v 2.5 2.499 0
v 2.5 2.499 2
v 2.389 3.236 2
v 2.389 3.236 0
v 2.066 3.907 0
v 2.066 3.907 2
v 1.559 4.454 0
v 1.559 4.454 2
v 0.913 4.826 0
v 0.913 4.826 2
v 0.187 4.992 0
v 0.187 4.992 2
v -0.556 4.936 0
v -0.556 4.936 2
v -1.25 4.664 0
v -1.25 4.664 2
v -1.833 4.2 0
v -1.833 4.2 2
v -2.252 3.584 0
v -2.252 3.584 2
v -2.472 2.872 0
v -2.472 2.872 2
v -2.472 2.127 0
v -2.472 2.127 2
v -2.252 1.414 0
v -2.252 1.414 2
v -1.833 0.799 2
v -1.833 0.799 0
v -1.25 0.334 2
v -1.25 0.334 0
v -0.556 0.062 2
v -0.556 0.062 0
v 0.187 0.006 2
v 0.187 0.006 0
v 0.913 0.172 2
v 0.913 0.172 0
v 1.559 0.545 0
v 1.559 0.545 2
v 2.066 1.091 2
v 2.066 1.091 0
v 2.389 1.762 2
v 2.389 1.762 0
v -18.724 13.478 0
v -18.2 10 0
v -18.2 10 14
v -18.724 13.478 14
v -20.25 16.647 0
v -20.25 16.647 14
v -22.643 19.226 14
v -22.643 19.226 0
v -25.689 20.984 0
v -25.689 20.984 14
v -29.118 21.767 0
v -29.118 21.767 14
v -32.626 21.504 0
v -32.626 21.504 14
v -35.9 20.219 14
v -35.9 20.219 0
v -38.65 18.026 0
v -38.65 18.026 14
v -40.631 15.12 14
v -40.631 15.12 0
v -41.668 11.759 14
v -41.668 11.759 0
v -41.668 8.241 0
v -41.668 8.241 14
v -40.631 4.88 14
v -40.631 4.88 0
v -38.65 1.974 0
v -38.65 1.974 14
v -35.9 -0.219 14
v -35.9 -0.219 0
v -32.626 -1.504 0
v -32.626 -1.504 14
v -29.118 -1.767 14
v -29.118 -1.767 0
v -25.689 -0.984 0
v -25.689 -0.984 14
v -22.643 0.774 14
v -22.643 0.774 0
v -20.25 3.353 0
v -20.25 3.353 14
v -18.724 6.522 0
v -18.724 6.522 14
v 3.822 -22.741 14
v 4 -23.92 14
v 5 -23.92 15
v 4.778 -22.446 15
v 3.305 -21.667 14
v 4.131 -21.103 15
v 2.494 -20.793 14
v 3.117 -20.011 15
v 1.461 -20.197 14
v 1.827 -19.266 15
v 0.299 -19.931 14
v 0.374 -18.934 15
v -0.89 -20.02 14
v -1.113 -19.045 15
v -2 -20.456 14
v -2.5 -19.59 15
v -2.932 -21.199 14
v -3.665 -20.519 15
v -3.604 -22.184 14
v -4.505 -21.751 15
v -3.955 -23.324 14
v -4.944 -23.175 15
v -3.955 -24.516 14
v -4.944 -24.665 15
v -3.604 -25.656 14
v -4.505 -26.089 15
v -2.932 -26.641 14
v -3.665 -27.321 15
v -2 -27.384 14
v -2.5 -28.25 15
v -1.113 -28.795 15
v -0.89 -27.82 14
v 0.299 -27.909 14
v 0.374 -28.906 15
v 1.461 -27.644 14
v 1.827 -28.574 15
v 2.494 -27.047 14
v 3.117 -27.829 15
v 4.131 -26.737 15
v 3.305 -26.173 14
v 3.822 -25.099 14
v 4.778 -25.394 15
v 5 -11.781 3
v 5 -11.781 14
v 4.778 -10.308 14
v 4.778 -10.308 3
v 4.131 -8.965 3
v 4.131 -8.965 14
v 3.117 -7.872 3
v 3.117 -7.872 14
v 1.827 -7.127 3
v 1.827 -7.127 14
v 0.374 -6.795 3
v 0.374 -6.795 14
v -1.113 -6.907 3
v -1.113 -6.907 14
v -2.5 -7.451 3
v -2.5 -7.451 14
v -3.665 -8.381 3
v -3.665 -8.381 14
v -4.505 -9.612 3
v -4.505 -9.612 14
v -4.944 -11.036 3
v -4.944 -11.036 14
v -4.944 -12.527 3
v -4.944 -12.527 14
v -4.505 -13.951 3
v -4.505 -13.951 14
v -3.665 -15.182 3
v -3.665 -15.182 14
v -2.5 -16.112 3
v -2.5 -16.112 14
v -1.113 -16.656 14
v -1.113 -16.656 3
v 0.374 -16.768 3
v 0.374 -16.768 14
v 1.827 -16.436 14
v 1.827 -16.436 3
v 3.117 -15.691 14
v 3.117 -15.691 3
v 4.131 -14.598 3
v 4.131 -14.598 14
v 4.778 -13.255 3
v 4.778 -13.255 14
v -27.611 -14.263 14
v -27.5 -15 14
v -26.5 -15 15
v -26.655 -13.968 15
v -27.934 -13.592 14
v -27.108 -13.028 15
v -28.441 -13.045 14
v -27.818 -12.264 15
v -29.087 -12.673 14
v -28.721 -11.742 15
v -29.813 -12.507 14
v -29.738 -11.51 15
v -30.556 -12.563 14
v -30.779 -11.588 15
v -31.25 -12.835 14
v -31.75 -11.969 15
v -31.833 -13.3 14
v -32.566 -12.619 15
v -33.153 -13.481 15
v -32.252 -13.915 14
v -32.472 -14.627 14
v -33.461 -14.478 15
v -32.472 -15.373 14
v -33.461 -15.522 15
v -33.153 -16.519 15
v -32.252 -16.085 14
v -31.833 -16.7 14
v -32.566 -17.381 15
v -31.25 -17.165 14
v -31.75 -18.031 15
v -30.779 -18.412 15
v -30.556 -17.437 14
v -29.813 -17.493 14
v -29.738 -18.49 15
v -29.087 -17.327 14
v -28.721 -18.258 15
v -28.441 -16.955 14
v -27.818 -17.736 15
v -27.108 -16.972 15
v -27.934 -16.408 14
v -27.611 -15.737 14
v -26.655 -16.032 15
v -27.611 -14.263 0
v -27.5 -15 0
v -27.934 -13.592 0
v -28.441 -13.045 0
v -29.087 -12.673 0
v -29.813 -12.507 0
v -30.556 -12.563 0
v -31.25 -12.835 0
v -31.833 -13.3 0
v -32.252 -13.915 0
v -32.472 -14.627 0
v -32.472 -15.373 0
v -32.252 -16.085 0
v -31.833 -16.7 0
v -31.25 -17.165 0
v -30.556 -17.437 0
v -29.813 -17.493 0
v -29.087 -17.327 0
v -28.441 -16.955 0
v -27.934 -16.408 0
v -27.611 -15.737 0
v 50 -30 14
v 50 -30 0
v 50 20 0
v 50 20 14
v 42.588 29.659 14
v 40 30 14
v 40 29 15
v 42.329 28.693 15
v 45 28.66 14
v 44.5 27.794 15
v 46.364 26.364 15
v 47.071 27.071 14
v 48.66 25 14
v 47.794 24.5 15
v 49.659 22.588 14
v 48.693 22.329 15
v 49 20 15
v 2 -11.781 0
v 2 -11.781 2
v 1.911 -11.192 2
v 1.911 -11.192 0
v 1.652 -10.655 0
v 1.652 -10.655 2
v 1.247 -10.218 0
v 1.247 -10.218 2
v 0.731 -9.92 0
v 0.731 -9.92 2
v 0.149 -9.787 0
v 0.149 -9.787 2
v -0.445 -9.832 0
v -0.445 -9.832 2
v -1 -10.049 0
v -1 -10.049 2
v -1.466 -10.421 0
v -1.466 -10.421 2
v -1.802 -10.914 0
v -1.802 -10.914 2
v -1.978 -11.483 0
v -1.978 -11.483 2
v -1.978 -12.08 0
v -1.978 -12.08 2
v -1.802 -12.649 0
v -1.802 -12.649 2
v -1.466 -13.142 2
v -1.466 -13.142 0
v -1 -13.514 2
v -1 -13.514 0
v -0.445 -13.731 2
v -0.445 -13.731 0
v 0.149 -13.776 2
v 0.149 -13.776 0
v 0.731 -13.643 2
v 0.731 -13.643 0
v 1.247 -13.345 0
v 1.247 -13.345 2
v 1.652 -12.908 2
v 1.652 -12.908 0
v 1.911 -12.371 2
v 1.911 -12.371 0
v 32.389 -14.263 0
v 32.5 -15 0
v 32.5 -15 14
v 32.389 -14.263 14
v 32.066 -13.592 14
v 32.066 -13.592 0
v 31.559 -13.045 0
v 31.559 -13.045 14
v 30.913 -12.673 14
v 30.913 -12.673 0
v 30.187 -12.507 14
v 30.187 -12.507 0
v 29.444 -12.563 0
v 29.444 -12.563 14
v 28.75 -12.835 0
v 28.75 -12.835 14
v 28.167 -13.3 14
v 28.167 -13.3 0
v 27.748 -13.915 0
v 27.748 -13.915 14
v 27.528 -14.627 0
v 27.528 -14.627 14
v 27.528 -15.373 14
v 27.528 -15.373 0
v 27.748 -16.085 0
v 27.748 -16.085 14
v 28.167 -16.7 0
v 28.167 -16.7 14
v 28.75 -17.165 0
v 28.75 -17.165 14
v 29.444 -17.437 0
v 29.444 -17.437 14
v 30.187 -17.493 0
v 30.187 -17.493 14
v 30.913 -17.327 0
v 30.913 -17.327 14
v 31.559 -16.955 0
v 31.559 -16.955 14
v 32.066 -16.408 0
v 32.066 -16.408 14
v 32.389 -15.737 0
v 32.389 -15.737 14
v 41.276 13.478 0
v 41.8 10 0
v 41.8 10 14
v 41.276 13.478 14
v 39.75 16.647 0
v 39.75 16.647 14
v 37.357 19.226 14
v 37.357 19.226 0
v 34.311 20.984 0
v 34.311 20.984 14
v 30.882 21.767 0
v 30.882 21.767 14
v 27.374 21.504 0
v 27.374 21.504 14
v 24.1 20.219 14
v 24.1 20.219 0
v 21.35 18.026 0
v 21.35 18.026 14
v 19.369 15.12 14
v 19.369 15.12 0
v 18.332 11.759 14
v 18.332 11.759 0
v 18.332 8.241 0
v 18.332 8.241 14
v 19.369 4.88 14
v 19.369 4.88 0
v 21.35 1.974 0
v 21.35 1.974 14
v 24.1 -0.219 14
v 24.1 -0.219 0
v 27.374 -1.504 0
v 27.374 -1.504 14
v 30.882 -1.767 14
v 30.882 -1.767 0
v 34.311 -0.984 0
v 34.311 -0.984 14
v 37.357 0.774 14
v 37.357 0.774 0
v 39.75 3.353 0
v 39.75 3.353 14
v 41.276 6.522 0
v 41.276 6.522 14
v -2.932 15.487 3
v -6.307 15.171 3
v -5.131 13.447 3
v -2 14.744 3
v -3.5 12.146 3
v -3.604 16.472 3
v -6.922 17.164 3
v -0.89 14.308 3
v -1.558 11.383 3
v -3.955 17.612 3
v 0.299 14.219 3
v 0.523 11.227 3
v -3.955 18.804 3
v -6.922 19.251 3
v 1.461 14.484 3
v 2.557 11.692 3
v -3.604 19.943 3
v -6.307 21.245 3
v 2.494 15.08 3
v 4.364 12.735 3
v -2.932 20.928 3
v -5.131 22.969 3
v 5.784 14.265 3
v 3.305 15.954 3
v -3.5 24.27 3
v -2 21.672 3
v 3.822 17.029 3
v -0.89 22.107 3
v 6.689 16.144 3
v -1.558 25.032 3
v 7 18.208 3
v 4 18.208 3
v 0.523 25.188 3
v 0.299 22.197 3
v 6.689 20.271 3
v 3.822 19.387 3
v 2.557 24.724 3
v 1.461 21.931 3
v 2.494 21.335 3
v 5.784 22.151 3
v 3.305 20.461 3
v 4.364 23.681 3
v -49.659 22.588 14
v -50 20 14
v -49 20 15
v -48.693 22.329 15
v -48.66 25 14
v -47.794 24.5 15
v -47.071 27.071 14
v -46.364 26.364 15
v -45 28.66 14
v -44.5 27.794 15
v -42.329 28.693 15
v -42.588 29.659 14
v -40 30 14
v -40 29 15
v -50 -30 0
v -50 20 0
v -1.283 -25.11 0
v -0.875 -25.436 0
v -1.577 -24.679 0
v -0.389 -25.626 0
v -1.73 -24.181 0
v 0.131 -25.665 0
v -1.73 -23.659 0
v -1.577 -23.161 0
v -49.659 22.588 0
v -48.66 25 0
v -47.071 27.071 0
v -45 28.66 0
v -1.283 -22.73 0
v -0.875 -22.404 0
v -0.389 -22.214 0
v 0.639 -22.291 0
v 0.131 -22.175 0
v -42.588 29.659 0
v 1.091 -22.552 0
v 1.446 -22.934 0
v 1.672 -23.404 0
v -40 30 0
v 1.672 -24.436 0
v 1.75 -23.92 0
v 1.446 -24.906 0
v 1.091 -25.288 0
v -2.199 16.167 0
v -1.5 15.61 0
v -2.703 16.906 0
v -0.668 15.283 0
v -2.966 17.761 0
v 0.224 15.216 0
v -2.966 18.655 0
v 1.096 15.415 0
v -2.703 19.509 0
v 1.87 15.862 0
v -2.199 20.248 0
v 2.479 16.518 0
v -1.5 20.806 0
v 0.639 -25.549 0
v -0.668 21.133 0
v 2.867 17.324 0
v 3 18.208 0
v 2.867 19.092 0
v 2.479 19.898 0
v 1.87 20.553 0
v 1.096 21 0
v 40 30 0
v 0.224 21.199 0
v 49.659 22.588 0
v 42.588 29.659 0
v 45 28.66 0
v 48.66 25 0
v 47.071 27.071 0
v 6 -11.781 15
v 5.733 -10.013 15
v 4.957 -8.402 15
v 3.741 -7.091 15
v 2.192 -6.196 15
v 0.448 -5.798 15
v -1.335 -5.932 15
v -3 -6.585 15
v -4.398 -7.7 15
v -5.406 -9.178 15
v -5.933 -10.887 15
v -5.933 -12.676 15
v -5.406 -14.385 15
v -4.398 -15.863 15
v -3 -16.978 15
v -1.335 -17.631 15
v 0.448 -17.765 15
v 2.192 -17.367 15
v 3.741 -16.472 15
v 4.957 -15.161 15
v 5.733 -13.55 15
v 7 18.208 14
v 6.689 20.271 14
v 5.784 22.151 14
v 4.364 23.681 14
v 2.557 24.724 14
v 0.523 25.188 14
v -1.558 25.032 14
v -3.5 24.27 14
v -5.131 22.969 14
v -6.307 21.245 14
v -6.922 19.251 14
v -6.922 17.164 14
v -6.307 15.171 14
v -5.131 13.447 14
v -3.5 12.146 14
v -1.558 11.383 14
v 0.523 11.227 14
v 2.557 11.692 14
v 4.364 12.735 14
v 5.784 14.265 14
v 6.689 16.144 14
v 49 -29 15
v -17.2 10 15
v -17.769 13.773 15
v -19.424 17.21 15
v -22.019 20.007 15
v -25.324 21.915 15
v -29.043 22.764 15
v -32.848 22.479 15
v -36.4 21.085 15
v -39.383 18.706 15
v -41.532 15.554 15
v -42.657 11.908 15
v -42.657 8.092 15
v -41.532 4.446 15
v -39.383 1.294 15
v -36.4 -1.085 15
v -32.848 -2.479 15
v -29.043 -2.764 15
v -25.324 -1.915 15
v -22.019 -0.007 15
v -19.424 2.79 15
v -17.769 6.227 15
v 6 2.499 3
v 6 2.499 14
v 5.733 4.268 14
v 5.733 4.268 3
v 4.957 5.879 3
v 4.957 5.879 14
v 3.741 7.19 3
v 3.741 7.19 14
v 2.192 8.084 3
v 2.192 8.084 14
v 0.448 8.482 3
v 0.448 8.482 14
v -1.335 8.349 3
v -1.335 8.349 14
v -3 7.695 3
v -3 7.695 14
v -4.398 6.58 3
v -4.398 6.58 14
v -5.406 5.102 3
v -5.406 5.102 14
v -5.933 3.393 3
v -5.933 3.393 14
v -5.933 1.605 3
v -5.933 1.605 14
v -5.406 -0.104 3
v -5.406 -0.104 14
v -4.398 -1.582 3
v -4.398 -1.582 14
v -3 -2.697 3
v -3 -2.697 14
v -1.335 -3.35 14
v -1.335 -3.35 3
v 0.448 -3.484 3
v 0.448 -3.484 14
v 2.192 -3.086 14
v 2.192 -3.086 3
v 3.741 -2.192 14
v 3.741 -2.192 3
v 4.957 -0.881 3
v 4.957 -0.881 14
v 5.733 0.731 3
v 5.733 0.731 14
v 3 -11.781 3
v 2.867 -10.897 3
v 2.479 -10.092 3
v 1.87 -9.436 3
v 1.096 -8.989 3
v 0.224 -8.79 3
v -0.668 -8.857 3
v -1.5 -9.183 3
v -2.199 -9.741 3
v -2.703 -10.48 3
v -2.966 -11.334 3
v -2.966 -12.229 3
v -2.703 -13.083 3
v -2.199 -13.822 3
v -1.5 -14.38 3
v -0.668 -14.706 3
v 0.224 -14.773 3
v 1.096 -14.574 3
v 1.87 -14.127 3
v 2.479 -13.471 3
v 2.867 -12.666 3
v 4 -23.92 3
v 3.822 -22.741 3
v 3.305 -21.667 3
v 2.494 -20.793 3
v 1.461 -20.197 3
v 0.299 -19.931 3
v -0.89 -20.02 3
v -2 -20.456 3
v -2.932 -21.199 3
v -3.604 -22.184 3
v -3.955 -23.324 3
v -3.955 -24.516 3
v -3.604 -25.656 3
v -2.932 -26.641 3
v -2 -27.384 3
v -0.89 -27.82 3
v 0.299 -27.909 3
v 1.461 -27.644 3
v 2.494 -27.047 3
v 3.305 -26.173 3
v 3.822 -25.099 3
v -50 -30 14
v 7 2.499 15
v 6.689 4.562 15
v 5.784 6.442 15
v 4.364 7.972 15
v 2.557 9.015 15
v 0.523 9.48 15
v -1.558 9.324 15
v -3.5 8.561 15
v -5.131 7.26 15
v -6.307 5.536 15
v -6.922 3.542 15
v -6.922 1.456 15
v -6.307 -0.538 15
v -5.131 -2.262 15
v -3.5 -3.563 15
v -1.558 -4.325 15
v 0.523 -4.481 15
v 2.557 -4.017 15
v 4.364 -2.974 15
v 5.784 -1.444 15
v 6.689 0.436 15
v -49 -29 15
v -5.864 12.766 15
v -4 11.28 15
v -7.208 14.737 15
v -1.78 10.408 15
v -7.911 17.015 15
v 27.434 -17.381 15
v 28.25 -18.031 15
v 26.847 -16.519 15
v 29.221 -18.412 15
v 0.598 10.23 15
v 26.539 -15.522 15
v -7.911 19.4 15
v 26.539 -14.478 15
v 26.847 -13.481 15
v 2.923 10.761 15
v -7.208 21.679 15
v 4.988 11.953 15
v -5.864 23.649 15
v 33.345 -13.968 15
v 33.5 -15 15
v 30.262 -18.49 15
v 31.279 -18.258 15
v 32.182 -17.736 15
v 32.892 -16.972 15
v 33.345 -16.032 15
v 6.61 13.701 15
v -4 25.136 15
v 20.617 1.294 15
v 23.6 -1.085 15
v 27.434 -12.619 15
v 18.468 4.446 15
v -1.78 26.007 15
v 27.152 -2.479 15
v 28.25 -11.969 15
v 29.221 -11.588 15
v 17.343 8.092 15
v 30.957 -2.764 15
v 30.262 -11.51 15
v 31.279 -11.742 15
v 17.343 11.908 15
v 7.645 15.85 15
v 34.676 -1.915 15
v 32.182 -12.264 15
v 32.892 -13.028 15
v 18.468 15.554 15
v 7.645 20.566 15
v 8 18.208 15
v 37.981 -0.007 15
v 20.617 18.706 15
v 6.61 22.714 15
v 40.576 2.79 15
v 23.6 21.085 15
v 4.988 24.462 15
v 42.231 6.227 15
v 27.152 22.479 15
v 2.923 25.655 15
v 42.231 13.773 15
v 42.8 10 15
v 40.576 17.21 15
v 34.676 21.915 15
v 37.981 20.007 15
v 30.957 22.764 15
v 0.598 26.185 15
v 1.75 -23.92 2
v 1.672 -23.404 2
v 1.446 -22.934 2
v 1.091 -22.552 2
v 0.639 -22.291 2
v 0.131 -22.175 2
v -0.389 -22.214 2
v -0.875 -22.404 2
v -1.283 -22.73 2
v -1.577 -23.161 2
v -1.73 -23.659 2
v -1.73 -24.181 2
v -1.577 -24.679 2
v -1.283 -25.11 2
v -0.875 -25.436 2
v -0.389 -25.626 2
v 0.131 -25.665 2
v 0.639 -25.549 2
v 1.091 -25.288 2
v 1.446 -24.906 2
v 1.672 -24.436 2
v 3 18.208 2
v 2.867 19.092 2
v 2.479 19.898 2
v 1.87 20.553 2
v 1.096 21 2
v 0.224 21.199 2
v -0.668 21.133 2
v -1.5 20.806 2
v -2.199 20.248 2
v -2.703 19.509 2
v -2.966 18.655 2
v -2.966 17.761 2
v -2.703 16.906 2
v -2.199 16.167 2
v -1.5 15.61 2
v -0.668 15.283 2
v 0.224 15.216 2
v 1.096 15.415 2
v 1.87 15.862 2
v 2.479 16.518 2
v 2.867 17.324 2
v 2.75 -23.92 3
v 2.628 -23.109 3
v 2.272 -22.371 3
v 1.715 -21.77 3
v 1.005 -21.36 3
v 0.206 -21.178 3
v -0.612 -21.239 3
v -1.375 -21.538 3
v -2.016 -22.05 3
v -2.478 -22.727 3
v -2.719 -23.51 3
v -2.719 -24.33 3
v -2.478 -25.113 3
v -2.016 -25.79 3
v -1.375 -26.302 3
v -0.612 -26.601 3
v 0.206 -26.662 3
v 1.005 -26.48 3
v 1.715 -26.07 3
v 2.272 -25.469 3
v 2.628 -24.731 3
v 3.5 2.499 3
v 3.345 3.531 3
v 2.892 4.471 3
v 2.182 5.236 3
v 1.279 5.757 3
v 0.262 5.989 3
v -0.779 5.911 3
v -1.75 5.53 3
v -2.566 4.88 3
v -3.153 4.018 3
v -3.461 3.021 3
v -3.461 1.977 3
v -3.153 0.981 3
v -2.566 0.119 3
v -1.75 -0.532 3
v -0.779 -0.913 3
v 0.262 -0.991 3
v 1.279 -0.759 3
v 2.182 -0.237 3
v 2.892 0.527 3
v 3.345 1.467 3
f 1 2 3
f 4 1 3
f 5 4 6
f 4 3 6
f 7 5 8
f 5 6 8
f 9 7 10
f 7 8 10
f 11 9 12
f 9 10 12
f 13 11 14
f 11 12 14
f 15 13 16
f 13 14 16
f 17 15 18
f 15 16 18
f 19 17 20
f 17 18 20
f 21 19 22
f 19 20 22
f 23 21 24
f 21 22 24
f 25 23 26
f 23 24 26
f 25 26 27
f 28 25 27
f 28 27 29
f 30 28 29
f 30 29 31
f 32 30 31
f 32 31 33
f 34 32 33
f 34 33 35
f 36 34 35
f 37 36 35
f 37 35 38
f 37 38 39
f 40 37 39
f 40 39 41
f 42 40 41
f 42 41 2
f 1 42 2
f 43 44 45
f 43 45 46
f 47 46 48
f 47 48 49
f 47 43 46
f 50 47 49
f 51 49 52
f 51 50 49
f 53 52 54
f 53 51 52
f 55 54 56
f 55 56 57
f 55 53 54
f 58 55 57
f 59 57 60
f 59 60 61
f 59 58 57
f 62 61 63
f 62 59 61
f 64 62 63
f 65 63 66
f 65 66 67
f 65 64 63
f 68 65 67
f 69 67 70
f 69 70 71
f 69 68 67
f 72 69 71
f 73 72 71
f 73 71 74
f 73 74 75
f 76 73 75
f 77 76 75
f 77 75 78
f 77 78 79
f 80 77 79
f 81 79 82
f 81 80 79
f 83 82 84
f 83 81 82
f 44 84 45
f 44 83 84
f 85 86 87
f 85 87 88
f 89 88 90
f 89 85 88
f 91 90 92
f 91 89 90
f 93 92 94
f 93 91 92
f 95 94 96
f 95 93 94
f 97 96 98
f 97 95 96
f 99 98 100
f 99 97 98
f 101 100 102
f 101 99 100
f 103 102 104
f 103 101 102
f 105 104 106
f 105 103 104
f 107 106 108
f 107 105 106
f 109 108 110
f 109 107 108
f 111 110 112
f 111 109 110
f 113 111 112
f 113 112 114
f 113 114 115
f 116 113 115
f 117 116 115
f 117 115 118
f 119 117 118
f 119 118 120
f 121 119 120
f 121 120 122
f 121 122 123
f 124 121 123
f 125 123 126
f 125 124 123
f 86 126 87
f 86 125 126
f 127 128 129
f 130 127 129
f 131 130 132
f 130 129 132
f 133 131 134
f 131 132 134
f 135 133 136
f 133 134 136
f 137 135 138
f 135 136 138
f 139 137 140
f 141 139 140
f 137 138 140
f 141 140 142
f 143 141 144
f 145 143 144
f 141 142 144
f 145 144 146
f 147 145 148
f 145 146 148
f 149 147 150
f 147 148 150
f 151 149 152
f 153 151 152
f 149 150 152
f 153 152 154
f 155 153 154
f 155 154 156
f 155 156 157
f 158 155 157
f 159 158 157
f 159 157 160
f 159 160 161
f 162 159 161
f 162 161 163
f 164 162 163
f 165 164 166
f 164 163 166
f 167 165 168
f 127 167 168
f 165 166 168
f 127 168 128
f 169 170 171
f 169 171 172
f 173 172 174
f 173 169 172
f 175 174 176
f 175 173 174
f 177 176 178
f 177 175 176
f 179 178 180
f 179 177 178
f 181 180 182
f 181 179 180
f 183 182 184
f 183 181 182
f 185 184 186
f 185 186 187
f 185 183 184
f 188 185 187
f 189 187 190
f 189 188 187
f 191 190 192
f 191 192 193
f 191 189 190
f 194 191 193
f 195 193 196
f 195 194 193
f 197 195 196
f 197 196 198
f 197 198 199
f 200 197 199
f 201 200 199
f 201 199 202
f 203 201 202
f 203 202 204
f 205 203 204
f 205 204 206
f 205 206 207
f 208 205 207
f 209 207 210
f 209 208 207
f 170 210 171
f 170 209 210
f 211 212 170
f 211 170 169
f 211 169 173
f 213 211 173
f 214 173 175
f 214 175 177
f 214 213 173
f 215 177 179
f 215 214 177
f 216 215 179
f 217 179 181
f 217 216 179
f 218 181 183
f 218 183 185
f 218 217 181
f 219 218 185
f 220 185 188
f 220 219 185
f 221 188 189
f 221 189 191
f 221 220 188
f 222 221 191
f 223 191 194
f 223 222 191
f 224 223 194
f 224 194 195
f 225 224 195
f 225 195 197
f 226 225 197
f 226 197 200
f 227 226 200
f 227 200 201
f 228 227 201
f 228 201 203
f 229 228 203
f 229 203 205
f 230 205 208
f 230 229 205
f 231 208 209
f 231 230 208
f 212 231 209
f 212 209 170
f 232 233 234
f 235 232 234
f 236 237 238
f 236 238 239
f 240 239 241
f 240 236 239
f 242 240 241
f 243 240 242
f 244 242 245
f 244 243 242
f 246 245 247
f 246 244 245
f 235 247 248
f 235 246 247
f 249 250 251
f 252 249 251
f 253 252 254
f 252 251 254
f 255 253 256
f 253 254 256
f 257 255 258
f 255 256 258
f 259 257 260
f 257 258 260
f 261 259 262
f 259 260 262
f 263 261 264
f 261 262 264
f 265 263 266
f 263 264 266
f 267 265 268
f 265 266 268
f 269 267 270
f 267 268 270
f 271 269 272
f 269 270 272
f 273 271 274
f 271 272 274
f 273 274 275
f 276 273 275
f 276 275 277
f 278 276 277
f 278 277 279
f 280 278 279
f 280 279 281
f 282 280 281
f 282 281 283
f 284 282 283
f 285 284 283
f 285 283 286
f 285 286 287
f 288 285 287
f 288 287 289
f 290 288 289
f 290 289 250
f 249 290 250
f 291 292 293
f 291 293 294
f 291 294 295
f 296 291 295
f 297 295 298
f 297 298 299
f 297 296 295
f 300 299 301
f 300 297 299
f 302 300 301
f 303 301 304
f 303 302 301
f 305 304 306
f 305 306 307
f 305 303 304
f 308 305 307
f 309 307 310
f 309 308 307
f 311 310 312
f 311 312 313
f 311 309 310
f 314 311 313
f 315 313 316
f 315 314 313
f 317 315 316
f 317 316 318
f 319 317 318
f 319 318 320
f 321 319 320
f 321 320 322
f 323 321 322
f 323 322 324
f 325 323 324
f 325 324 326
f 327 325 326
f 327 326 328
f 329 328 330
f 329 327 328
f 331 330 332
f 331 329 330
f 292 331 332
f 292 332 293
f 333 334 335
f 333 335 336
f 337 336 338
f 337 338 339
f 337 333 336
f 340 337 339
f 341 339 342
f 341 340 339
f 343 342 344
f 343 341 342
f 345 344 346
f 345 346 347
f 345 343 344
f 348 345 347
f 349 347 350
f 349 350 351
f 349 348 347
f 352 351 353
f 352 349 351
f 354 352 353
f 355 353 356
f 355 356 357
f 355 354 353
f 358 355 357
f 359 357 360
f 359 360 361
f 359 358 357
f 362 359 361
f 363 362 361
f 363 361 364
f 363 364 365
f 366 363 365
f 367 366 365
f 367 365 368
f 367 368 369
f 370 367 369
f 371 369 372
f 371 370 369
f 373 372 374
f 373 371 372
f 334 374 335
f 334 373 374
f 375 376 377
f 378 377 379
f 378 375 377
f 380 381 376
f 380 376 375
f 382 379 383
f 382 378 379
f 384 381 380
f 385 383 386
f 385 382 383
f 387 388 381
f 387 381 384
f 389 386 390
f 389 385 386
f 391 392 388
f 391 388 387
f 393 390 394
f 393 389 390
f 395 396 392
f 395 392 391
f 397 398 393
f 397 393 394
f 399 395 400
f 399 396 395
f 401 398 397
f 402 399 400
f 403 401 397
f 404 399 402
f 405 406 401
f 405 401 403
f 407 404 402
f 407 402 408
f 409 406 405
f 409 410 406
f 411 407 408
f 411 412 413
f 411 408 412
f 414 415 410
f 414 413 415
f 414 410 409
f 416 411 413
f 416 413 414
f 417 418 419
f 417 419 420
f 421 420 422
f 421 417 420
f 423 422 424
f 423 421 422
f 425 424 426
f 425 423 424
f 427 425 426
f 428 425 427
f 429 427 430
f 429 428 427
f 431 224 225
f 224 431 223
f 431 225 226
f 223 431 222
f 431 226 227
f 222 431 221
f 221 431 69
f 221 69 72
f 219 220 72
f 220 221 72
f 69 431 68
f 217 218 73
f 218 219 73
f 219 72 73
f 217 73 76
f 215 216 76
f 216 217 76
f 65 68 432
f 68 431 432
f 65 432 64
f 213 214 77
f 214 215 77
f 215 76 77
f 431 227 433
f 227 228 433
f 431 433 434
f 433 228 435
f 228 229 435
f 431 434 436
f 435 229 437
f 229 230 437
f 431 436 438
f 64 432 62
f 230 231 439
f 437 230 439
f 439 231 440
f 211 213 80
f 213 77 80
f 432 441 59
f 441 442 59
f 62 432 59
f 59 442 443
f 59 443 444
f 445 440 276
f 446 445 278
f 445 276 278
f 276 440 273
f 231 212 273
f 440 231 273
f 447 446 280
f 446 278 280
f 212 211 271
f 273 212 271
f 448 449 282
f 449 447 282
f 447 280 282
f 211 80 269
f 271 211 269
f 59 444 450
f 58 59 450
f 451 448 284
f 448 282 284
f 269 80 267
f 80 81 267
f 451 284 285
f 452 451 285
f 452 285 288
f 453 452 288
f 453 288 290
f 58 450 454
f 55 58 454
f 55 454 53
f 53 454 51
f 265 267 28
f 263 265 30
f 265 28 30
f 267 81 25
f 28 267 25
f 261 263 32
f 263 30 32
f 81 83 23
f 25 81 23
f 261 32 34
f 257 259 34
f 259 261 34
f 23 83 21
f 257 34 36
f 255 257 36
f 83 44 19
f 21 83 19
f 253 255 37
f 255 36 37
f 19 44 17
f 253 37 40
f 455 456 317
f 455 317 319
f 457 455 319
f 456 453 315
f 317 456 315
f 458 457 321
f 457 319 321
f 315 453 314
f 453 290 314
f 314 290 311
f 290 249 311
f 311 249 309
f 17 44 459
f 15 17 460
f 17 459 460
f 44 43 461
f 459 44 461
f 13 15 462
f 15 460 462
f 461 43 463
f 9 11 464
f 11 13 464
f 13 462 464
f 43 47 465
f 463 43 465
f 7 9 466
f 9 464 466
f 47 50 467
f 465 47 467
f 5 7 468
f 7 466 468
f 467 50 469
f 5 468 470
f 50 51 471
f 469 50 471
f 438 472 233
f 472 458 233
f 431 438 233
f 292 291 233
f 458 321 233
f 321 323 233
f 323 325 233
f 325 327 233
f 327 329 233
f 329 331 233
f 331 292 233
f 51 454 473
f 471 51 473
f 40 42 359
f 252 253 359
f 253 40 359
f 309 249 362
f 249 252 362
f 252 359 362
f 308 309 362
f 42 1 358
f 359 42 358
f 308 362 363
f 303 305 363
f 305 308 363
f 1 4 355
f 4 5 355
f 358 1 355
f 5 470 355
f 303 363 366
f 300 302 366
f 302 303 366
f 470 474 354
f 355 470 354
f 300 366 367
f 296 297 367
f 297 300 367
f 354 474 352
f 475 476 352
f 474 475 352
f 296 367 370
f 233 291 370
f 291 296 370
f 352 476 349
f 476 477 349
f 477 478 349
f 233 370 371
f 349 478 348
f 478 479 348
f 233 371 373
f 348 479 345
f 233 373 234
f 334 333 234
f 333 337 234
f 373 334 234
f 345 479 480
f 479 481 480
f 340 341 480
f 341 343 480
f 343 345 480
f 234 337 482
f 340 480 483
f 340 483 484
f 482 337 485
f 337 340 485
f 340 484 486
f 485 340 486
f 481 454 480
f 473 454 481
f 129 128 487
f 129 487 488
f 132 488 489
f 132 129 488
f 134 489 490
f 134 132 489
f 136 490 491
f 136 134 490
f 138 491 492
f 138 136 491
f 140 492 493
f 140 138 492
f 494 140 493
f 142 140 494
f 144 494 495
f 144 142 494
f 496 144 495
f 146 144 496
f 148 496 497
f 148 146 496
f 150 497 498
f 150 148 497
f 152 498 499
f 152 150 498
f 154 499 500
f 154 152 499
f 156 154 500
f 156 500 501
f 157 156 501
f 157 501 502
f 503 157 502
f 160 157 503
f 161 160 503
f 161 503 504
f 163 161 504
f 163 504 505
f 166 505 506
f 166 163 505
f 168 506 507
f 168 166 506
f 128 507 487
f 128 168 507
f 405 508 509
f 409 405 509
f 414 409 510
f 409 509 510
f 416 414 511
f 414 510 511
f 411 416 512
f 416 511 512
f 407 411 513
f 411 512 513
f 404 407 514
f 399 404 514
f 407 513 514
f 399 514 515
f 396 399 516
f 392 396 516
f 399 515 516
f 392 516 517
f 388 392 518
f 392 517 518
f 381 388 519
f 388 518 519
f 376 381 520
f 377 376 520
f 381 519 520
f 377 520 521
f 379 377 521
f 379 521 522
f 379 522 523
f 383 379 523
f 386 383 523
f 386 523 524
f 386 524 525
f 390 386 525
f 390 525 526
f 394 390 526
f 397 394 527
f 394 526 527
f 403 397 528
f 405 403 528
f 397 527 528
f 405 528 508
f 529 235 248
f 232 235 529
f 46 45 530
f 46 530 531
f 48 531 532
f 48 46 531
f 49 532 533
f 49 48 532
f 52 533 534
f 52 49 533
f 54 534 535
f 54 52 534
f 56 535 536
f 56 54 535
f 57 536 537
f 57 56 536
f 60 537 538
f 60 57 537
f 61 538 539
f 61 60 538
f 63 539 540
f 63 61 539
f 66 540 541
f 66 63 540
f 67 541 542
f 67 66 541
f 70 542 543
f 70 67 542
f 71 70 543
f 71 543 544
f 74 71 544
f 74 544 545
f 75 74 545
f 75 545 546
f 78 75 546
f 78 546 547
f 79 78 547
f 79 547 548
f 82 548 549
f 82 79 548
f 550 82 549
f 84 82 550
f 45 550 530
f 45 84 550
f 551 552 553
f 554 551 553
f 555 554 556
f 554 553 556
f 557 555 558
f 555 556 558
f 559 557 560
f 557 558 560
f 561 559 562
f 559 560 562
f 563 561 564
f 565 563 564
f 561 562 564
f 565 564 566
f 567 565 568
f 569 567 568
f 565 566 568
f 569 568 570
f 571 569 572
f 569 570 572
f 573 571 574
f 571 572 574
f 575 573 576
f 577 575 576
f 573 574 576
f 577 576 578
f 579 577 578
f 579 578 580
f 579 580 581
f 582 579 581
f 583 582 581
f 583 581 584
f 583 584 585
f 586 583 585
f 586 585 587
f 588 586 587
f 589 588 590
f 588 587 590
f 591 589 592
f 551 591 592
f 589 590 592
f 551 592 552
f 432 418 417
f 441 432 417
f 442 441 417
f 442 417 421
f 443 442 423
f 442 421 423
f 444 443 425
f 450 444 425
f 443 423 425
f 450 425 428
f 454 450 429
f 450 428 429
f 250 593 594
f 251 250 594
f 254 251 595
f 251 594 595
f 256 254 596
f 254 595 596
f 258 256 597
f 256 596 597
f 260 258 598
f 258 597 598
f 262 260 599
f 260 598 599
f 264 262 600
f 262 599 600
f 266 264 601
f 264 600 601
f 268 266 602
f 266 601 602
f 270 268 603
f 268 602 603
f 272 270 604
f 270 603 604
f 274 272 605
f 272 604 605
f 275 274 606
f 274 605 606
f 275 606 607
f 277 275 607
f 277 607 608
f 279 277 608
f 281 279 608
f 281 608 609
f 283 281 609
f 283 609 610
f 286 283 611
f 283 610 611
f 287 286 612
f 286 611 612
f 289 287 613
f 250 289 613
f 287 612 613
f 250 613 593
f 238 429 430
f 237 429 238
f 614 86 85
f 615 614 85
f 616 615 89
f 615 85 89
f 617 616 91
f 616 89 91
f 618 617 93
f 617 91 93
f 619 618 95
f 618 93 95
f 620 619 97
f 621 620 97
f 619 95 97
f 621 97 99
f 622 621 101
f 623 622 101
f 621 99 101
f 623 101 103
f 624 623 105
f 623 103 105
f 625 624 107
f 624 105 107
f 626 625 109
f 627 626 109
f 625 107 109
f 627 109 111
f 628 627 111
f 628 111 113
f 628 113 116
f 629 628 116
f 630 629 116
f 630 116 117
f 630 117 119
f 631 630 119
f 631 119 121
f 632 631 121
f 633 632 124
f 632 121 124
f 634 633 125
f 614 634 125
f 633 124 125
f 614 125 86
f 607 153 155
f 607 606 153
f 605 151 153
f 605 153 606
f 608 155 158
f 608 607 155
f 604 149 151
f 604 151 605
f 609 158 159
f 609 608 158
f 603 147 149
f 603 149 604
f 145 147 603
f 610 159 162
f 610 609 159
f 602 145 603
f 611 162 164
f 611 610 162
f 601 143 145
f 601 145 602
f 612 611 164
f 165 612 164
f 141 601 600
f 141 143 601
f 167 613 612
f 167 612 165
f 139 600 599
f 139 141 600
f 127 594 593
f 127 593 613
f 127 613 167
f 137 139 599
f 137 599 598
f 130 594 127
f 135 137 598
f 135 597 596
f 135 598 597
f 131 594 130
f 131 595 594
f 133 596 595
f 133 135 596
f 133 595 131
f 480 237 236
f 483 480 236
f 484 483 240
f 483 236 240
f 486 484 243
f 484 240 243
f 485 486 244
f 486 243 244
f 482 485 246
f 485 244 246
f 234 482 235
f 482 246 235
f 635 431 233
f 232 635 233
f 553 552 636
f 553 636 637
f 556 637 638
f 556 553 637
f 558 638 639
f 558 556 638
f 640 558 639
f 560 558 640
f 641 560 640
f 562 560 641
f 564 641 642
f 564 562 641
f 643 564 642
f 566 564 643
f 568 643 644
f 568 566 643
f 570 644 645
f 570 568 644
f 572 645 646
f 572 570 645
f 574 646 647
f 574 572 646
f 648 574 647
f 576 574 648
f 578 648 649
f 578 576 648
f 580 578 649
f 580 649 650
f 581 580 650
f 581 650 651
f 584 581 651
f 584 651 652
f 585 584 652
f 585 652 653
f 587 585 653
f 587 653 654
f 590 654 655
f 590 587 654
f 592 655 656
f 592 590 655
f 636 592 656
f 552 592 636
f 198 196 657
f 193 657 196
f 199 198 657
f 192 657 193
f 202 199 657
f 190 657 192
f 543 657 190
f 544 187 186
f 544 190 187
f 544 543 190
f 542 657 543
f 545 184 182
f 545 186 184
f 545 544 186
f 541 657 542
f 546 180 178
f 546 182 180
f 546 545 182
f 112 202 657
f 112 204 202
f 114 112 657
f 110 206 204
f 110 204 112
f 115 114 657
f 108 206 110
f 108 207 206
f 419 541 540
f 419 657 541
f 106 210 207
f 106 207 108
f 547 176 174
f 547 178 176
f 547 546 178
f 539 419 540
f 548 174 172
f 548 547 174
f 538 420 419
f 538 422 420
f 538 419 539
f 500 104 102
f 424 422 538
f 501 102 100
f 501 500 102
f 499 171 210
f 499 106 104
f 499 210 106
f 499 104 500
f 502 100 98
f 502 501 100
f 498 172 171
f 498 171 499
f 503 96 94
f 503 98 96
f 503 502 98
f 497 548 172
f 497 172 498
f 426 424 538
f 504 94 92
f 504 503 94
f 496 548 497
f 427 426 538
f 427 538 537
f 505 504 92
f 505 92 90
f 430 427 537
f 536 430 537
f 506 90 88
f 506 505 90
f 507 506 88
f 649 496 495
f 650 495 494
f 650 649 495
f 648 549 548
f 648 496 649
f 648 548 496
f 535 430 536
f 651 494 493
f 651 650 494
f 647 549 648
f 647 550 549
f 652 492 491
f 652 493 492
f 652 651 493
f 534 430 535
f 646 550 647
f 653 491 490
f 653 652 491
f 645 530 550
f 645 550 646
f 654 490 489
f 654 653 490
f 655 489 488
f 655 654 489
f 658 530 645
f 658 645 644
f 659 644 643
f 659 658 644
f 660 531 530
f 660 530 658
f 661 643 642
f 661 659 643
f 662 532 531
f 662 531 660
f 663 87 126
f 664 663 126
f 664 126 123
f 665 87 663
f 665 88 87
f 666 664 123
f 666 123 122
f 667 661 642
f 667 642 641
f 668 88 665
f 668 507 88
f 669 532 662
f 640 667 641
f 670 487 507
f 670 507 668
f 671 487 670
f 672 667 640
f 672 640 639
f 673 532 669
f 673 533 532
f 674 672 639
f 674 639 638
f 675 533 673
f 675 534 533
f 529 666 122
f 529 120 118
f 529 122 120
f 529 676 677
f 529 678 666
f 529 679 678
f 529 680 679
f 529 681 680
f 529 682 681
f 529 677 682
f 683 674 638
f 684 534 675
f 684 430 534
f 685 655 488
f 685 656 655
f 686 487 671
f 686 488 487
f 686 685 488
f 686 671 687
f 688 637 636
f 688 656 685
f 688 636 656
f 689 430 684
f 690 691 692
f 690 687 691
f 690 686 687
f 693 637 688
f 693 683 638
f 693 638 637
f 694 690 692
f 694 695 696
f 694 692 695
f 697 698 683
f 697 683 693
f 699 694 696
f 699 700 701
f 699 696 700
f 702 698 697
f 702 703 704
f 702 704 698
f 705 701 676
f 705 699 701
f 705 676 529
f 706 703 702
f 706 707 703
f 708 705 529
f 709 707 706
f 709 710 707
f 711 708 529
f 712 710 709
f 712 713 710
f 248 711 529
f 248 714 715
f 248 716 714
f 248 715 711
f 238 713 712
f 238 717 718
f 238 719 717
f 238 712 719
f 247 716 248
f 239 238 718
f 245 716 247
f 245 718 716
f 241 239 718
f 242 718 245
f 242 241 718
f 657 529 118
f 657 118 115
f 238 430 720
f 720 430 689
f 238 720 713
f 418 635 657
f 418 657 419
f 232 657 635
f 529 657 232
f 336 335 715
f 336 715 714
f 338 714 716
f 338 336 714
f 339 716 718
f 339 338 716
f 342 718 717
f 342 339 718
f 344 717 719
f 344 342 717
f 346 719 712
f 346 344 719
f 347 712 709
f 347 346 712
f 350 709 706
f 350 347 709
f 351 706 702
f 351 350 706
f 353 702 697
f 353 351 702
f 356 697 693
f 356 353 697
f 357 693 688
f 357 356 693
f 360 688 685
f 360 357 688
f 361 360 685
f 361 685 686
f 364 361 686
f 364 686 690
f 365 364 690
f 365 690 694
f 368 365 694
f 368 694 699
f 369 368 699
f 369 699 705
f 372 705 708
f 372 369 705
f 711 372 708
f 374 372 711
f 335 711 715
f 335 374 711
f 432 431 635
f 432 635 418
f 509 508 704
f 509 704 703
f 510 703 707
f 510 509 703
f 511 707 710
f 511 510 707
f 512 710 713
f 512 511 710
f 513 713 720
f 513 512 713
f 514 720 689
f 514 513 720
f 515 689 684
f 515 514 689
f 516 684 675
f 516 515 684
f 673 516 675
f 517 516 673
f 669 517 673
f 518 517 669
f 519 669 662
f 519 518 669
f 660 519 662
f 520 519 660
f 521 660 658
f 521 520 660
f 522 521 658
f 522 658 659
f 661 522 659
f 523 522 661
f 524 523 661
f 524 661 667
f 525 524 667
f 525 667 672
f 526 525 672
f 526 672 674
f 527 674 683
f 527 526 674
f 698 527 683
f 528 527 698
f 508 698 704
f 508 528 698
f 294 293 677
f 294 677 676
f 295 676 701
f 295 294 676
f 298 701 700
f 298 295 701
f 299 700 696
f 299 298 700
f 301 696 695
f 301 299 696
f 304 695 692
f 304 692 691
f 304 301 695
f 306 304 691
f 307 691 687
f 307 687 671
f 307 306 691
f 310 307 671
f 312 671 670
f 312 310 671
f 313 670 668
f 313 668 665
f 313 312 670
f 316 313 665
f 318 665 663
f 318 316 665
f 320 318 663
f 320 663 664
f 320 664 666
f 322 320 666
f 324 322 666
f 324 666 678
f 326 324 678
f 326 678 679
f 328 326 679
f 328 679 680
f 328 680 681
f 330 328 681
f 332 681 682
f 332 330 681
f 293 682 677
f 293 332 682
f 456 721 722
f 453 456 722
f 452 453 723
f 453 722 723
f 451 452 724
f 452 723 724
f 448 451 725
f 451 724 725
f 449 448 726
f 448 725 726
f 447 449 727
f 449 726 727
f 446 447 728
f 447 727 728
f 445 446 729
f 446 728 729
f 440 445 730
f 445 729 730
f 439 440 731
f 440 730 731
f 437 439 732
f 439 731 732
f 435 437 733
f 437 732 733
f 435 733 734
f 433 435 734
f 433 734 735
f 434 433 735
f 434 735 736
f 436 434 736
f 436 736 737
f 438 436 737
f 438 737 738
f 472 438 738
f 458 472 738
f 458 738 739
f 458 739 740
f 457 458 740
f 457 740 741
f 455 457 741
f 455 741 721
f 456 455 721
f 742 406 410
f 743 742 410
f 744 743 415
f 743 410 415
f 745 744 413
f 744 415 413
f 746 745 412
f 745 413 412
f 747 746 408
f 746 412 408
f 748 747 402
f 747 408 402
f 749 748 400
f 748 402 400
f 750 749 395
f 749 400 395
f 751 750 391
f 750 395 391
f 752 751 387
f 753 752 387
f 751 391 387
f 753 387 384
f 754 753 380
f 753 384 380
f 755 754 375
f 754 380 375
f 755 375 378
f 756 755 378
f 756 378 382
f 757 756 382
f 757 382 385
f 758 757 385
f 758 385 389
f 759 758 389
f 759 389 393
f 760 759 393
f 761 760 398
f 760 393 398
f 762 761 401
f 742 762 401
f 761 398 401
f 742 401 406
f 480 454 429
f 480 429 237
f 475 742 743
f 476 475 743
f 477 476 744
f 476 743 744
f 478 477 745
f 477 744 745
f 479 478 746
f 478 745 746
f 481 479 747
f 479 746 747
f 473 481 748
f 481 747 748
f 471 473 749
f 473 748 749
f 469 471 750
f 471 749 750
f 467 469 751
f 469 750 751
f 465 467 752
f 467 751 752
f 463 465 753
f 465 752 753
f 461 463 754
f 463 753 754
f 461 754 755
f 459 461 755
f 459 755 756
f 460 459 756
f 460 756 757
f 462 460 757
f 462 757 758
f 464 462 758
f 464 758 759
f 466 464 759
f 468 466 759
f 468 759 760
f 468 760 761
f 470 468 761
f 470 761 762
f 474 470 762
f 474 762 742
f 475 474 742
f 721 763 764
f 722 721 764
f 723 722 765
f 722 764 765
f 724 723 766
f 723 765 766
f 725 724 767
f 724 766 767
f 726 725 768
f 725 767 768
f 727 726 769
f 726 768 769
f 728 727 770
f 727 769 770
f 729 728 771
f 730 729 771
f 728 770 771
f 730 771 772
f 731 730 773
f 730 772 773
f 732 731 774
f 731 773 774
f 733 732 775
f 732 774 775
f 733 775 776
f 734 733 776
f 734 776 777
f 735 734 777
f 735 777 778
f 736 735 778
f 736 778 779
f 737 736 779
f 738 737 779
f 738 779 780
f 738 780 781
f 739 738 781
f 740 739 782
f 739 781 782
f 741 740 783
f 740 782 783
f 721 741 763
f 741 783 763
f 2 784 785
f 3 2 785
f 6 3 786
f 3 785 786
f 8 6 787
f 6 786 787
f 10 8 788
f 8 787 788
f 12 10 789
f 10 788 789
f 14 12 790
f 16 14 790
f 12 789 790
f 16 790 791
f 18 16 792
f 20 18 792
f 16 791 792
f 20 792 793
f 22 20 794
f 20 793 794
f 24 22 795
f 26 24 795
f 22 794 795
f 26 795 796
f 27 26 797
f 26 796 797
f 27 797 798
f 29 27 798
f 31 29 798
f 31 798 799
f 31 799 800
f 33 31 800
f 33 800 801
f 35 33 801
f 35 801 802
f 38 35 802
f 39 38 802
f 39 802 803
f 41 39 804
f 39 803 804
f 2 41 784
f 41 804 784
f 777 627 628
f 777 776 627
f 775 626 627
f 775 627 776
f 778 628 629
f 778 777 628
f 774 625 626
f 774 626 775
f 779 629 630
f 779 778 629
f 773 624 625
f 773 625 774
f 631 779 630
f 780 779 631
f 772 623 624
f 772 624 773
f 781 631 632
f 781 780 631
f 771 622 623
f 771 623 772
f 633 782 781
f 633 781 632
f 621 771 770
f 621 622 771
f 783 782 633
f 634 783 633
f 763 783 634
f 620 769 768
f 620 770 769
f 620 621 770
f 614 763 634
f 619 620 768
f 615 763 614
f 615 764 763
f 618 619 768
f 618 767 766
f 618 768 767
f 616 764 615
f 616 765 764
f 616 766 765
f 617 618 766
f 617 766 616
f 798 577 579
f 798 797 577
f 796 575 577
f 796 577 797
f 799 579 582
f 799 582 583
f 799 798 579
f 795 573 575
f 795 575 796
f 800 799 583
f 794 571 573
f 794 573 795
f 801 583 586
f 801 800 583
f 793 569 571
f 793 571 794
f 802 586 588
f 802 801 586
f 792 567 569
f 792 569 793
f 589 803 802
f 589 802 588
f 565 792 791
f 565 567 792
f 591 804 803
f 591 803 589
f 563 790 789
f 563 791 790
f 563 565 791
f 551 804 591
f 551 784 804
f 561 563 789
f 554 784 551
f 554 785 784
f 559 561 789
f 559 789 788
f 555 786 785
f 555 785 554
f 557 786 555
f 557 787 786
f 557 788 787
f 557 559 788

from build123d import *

# Parameters (mm, degrees)
SKETCH_W        = 100
SKETCH_H        = 60
SKETCH_R        = 11.8
SKETCH_R_2      = 2.5
PAD_DEPTH       = 15
FILLET_R        = 10
SKETCH001_R     = 7
SKETCH001_R_2   = 6
SKETCH001_R_3   = 5
SKETCH001_R_4   = 4
POCKET_DEPTH    = 12
SKETCH002_R     = 3
SKETCH002_R_2   = 2.5
SKETCH002_R_3   = 1.75
SKETCH002_R_4   = 2
POCKET001_DEPTH = 5
CHAMFER_SIZE    = 1
CHAMFER001_SIZE = 1


with BuildPart() as part:
    # Sketch → Pad (new body)
    with BuildSketch(Plane.XY):
        Rectangle(SKETCH_W, SKETCH_H)
        with Locations((-30, 10)):
            Circle(SKETCH_R, mode=Mode.SUBTRACT)
        with Locations((30, 10)):
            Circle(SKETCH_R, mode=Mode.SUBTRACT)
        with Locations((-30, -15)):
            Circle(SKETCH_R_2, mode=Mode.SUBTRACT)
        with Locations((30, -15)):
            Circle(SKETCH_R_2, mode=Mode.SUBTRACT)
    extrude(amount=PAD_DEPTH)

    # Fillet
    fillet_edges = [part.edges().sort_by_distance(p)[0] for p in [
        (-50, 30, 7.5),
        (50, 30, 7.5),
    ]]
    fillet(fillet_edges, radius=FILLET_R)

    # Sketch001 → Pocket (cut)
    with BuildSketch(Plane.XY.offset(15)):
        with Locations((0, 18.207773)):
            Circle(SKETCH001_R)
        with Locations((0, 2.49911)):
            Circle(SKETCH001_R_2)
        with Locations((0, -11.781498)):
            Circle(SKETCH001_R_3)
        with Locations((0, -23.920012)):
            Circle(SKETCH001_R_4)
    extrude(amount=-POCKET_DEPTH, mode=Mode.SUBTRACT)

    # Sketch002 → Pocket001 (cut)
    with BuildSketch(Plane.XY.offset(3)):
        with Locations((0, 18.207773)):
            Circle(SKETCH002_R)
        with Locations((0, 2.49911)):
            Circle(SKETCH002_R_2)
        with Locations((0, -23.920012)):
            Circle(SKETCH002_R_3)
        with Locations((0, -11.781498)):
            Circle(SKETCH002_R_4)
    extrude(amount=-POCKET001_DEPTH, mode=Mode.SUBTRACT)

    # Chamfer
    chamfer_edges = [part.edges().sort_by_distance(p)[0] for p in [
        (0, 30, 15),
        (-47.071068, 27.071068, 15),
        (47.071068, 27.071068, 15),
        (-50, -5, 15),
        (50, -5, 15),
        (0, -30, 15),
        (-4, -23.920012, 15),
        (-5, -11.781498, 15),
        (-7, 18.207773, 15),
        (-6, 2.49911, 15),
        (-32.5, -15, 15),
        (-41.8, 10, 15),
        (18.2, 10, 15),
        (27.5, -15, 15),
    ]]
    chamfer(chamfer_edges, length=CHAMFER_SIZE)

    # Chamfer001
    chamfer001_edges = [part.edges().sort_by_distance(p)[0] for p in [
        (-3, 18.207773, 3),
        (-2.5, 2.49911, 3),
        (-2, -11.781498, 3),
        (-1.75, -23.920012, 3),
    ]]
    chamfer(chamfer001_edges, length=CHAMFER001_SIZE)


solid = part.part
